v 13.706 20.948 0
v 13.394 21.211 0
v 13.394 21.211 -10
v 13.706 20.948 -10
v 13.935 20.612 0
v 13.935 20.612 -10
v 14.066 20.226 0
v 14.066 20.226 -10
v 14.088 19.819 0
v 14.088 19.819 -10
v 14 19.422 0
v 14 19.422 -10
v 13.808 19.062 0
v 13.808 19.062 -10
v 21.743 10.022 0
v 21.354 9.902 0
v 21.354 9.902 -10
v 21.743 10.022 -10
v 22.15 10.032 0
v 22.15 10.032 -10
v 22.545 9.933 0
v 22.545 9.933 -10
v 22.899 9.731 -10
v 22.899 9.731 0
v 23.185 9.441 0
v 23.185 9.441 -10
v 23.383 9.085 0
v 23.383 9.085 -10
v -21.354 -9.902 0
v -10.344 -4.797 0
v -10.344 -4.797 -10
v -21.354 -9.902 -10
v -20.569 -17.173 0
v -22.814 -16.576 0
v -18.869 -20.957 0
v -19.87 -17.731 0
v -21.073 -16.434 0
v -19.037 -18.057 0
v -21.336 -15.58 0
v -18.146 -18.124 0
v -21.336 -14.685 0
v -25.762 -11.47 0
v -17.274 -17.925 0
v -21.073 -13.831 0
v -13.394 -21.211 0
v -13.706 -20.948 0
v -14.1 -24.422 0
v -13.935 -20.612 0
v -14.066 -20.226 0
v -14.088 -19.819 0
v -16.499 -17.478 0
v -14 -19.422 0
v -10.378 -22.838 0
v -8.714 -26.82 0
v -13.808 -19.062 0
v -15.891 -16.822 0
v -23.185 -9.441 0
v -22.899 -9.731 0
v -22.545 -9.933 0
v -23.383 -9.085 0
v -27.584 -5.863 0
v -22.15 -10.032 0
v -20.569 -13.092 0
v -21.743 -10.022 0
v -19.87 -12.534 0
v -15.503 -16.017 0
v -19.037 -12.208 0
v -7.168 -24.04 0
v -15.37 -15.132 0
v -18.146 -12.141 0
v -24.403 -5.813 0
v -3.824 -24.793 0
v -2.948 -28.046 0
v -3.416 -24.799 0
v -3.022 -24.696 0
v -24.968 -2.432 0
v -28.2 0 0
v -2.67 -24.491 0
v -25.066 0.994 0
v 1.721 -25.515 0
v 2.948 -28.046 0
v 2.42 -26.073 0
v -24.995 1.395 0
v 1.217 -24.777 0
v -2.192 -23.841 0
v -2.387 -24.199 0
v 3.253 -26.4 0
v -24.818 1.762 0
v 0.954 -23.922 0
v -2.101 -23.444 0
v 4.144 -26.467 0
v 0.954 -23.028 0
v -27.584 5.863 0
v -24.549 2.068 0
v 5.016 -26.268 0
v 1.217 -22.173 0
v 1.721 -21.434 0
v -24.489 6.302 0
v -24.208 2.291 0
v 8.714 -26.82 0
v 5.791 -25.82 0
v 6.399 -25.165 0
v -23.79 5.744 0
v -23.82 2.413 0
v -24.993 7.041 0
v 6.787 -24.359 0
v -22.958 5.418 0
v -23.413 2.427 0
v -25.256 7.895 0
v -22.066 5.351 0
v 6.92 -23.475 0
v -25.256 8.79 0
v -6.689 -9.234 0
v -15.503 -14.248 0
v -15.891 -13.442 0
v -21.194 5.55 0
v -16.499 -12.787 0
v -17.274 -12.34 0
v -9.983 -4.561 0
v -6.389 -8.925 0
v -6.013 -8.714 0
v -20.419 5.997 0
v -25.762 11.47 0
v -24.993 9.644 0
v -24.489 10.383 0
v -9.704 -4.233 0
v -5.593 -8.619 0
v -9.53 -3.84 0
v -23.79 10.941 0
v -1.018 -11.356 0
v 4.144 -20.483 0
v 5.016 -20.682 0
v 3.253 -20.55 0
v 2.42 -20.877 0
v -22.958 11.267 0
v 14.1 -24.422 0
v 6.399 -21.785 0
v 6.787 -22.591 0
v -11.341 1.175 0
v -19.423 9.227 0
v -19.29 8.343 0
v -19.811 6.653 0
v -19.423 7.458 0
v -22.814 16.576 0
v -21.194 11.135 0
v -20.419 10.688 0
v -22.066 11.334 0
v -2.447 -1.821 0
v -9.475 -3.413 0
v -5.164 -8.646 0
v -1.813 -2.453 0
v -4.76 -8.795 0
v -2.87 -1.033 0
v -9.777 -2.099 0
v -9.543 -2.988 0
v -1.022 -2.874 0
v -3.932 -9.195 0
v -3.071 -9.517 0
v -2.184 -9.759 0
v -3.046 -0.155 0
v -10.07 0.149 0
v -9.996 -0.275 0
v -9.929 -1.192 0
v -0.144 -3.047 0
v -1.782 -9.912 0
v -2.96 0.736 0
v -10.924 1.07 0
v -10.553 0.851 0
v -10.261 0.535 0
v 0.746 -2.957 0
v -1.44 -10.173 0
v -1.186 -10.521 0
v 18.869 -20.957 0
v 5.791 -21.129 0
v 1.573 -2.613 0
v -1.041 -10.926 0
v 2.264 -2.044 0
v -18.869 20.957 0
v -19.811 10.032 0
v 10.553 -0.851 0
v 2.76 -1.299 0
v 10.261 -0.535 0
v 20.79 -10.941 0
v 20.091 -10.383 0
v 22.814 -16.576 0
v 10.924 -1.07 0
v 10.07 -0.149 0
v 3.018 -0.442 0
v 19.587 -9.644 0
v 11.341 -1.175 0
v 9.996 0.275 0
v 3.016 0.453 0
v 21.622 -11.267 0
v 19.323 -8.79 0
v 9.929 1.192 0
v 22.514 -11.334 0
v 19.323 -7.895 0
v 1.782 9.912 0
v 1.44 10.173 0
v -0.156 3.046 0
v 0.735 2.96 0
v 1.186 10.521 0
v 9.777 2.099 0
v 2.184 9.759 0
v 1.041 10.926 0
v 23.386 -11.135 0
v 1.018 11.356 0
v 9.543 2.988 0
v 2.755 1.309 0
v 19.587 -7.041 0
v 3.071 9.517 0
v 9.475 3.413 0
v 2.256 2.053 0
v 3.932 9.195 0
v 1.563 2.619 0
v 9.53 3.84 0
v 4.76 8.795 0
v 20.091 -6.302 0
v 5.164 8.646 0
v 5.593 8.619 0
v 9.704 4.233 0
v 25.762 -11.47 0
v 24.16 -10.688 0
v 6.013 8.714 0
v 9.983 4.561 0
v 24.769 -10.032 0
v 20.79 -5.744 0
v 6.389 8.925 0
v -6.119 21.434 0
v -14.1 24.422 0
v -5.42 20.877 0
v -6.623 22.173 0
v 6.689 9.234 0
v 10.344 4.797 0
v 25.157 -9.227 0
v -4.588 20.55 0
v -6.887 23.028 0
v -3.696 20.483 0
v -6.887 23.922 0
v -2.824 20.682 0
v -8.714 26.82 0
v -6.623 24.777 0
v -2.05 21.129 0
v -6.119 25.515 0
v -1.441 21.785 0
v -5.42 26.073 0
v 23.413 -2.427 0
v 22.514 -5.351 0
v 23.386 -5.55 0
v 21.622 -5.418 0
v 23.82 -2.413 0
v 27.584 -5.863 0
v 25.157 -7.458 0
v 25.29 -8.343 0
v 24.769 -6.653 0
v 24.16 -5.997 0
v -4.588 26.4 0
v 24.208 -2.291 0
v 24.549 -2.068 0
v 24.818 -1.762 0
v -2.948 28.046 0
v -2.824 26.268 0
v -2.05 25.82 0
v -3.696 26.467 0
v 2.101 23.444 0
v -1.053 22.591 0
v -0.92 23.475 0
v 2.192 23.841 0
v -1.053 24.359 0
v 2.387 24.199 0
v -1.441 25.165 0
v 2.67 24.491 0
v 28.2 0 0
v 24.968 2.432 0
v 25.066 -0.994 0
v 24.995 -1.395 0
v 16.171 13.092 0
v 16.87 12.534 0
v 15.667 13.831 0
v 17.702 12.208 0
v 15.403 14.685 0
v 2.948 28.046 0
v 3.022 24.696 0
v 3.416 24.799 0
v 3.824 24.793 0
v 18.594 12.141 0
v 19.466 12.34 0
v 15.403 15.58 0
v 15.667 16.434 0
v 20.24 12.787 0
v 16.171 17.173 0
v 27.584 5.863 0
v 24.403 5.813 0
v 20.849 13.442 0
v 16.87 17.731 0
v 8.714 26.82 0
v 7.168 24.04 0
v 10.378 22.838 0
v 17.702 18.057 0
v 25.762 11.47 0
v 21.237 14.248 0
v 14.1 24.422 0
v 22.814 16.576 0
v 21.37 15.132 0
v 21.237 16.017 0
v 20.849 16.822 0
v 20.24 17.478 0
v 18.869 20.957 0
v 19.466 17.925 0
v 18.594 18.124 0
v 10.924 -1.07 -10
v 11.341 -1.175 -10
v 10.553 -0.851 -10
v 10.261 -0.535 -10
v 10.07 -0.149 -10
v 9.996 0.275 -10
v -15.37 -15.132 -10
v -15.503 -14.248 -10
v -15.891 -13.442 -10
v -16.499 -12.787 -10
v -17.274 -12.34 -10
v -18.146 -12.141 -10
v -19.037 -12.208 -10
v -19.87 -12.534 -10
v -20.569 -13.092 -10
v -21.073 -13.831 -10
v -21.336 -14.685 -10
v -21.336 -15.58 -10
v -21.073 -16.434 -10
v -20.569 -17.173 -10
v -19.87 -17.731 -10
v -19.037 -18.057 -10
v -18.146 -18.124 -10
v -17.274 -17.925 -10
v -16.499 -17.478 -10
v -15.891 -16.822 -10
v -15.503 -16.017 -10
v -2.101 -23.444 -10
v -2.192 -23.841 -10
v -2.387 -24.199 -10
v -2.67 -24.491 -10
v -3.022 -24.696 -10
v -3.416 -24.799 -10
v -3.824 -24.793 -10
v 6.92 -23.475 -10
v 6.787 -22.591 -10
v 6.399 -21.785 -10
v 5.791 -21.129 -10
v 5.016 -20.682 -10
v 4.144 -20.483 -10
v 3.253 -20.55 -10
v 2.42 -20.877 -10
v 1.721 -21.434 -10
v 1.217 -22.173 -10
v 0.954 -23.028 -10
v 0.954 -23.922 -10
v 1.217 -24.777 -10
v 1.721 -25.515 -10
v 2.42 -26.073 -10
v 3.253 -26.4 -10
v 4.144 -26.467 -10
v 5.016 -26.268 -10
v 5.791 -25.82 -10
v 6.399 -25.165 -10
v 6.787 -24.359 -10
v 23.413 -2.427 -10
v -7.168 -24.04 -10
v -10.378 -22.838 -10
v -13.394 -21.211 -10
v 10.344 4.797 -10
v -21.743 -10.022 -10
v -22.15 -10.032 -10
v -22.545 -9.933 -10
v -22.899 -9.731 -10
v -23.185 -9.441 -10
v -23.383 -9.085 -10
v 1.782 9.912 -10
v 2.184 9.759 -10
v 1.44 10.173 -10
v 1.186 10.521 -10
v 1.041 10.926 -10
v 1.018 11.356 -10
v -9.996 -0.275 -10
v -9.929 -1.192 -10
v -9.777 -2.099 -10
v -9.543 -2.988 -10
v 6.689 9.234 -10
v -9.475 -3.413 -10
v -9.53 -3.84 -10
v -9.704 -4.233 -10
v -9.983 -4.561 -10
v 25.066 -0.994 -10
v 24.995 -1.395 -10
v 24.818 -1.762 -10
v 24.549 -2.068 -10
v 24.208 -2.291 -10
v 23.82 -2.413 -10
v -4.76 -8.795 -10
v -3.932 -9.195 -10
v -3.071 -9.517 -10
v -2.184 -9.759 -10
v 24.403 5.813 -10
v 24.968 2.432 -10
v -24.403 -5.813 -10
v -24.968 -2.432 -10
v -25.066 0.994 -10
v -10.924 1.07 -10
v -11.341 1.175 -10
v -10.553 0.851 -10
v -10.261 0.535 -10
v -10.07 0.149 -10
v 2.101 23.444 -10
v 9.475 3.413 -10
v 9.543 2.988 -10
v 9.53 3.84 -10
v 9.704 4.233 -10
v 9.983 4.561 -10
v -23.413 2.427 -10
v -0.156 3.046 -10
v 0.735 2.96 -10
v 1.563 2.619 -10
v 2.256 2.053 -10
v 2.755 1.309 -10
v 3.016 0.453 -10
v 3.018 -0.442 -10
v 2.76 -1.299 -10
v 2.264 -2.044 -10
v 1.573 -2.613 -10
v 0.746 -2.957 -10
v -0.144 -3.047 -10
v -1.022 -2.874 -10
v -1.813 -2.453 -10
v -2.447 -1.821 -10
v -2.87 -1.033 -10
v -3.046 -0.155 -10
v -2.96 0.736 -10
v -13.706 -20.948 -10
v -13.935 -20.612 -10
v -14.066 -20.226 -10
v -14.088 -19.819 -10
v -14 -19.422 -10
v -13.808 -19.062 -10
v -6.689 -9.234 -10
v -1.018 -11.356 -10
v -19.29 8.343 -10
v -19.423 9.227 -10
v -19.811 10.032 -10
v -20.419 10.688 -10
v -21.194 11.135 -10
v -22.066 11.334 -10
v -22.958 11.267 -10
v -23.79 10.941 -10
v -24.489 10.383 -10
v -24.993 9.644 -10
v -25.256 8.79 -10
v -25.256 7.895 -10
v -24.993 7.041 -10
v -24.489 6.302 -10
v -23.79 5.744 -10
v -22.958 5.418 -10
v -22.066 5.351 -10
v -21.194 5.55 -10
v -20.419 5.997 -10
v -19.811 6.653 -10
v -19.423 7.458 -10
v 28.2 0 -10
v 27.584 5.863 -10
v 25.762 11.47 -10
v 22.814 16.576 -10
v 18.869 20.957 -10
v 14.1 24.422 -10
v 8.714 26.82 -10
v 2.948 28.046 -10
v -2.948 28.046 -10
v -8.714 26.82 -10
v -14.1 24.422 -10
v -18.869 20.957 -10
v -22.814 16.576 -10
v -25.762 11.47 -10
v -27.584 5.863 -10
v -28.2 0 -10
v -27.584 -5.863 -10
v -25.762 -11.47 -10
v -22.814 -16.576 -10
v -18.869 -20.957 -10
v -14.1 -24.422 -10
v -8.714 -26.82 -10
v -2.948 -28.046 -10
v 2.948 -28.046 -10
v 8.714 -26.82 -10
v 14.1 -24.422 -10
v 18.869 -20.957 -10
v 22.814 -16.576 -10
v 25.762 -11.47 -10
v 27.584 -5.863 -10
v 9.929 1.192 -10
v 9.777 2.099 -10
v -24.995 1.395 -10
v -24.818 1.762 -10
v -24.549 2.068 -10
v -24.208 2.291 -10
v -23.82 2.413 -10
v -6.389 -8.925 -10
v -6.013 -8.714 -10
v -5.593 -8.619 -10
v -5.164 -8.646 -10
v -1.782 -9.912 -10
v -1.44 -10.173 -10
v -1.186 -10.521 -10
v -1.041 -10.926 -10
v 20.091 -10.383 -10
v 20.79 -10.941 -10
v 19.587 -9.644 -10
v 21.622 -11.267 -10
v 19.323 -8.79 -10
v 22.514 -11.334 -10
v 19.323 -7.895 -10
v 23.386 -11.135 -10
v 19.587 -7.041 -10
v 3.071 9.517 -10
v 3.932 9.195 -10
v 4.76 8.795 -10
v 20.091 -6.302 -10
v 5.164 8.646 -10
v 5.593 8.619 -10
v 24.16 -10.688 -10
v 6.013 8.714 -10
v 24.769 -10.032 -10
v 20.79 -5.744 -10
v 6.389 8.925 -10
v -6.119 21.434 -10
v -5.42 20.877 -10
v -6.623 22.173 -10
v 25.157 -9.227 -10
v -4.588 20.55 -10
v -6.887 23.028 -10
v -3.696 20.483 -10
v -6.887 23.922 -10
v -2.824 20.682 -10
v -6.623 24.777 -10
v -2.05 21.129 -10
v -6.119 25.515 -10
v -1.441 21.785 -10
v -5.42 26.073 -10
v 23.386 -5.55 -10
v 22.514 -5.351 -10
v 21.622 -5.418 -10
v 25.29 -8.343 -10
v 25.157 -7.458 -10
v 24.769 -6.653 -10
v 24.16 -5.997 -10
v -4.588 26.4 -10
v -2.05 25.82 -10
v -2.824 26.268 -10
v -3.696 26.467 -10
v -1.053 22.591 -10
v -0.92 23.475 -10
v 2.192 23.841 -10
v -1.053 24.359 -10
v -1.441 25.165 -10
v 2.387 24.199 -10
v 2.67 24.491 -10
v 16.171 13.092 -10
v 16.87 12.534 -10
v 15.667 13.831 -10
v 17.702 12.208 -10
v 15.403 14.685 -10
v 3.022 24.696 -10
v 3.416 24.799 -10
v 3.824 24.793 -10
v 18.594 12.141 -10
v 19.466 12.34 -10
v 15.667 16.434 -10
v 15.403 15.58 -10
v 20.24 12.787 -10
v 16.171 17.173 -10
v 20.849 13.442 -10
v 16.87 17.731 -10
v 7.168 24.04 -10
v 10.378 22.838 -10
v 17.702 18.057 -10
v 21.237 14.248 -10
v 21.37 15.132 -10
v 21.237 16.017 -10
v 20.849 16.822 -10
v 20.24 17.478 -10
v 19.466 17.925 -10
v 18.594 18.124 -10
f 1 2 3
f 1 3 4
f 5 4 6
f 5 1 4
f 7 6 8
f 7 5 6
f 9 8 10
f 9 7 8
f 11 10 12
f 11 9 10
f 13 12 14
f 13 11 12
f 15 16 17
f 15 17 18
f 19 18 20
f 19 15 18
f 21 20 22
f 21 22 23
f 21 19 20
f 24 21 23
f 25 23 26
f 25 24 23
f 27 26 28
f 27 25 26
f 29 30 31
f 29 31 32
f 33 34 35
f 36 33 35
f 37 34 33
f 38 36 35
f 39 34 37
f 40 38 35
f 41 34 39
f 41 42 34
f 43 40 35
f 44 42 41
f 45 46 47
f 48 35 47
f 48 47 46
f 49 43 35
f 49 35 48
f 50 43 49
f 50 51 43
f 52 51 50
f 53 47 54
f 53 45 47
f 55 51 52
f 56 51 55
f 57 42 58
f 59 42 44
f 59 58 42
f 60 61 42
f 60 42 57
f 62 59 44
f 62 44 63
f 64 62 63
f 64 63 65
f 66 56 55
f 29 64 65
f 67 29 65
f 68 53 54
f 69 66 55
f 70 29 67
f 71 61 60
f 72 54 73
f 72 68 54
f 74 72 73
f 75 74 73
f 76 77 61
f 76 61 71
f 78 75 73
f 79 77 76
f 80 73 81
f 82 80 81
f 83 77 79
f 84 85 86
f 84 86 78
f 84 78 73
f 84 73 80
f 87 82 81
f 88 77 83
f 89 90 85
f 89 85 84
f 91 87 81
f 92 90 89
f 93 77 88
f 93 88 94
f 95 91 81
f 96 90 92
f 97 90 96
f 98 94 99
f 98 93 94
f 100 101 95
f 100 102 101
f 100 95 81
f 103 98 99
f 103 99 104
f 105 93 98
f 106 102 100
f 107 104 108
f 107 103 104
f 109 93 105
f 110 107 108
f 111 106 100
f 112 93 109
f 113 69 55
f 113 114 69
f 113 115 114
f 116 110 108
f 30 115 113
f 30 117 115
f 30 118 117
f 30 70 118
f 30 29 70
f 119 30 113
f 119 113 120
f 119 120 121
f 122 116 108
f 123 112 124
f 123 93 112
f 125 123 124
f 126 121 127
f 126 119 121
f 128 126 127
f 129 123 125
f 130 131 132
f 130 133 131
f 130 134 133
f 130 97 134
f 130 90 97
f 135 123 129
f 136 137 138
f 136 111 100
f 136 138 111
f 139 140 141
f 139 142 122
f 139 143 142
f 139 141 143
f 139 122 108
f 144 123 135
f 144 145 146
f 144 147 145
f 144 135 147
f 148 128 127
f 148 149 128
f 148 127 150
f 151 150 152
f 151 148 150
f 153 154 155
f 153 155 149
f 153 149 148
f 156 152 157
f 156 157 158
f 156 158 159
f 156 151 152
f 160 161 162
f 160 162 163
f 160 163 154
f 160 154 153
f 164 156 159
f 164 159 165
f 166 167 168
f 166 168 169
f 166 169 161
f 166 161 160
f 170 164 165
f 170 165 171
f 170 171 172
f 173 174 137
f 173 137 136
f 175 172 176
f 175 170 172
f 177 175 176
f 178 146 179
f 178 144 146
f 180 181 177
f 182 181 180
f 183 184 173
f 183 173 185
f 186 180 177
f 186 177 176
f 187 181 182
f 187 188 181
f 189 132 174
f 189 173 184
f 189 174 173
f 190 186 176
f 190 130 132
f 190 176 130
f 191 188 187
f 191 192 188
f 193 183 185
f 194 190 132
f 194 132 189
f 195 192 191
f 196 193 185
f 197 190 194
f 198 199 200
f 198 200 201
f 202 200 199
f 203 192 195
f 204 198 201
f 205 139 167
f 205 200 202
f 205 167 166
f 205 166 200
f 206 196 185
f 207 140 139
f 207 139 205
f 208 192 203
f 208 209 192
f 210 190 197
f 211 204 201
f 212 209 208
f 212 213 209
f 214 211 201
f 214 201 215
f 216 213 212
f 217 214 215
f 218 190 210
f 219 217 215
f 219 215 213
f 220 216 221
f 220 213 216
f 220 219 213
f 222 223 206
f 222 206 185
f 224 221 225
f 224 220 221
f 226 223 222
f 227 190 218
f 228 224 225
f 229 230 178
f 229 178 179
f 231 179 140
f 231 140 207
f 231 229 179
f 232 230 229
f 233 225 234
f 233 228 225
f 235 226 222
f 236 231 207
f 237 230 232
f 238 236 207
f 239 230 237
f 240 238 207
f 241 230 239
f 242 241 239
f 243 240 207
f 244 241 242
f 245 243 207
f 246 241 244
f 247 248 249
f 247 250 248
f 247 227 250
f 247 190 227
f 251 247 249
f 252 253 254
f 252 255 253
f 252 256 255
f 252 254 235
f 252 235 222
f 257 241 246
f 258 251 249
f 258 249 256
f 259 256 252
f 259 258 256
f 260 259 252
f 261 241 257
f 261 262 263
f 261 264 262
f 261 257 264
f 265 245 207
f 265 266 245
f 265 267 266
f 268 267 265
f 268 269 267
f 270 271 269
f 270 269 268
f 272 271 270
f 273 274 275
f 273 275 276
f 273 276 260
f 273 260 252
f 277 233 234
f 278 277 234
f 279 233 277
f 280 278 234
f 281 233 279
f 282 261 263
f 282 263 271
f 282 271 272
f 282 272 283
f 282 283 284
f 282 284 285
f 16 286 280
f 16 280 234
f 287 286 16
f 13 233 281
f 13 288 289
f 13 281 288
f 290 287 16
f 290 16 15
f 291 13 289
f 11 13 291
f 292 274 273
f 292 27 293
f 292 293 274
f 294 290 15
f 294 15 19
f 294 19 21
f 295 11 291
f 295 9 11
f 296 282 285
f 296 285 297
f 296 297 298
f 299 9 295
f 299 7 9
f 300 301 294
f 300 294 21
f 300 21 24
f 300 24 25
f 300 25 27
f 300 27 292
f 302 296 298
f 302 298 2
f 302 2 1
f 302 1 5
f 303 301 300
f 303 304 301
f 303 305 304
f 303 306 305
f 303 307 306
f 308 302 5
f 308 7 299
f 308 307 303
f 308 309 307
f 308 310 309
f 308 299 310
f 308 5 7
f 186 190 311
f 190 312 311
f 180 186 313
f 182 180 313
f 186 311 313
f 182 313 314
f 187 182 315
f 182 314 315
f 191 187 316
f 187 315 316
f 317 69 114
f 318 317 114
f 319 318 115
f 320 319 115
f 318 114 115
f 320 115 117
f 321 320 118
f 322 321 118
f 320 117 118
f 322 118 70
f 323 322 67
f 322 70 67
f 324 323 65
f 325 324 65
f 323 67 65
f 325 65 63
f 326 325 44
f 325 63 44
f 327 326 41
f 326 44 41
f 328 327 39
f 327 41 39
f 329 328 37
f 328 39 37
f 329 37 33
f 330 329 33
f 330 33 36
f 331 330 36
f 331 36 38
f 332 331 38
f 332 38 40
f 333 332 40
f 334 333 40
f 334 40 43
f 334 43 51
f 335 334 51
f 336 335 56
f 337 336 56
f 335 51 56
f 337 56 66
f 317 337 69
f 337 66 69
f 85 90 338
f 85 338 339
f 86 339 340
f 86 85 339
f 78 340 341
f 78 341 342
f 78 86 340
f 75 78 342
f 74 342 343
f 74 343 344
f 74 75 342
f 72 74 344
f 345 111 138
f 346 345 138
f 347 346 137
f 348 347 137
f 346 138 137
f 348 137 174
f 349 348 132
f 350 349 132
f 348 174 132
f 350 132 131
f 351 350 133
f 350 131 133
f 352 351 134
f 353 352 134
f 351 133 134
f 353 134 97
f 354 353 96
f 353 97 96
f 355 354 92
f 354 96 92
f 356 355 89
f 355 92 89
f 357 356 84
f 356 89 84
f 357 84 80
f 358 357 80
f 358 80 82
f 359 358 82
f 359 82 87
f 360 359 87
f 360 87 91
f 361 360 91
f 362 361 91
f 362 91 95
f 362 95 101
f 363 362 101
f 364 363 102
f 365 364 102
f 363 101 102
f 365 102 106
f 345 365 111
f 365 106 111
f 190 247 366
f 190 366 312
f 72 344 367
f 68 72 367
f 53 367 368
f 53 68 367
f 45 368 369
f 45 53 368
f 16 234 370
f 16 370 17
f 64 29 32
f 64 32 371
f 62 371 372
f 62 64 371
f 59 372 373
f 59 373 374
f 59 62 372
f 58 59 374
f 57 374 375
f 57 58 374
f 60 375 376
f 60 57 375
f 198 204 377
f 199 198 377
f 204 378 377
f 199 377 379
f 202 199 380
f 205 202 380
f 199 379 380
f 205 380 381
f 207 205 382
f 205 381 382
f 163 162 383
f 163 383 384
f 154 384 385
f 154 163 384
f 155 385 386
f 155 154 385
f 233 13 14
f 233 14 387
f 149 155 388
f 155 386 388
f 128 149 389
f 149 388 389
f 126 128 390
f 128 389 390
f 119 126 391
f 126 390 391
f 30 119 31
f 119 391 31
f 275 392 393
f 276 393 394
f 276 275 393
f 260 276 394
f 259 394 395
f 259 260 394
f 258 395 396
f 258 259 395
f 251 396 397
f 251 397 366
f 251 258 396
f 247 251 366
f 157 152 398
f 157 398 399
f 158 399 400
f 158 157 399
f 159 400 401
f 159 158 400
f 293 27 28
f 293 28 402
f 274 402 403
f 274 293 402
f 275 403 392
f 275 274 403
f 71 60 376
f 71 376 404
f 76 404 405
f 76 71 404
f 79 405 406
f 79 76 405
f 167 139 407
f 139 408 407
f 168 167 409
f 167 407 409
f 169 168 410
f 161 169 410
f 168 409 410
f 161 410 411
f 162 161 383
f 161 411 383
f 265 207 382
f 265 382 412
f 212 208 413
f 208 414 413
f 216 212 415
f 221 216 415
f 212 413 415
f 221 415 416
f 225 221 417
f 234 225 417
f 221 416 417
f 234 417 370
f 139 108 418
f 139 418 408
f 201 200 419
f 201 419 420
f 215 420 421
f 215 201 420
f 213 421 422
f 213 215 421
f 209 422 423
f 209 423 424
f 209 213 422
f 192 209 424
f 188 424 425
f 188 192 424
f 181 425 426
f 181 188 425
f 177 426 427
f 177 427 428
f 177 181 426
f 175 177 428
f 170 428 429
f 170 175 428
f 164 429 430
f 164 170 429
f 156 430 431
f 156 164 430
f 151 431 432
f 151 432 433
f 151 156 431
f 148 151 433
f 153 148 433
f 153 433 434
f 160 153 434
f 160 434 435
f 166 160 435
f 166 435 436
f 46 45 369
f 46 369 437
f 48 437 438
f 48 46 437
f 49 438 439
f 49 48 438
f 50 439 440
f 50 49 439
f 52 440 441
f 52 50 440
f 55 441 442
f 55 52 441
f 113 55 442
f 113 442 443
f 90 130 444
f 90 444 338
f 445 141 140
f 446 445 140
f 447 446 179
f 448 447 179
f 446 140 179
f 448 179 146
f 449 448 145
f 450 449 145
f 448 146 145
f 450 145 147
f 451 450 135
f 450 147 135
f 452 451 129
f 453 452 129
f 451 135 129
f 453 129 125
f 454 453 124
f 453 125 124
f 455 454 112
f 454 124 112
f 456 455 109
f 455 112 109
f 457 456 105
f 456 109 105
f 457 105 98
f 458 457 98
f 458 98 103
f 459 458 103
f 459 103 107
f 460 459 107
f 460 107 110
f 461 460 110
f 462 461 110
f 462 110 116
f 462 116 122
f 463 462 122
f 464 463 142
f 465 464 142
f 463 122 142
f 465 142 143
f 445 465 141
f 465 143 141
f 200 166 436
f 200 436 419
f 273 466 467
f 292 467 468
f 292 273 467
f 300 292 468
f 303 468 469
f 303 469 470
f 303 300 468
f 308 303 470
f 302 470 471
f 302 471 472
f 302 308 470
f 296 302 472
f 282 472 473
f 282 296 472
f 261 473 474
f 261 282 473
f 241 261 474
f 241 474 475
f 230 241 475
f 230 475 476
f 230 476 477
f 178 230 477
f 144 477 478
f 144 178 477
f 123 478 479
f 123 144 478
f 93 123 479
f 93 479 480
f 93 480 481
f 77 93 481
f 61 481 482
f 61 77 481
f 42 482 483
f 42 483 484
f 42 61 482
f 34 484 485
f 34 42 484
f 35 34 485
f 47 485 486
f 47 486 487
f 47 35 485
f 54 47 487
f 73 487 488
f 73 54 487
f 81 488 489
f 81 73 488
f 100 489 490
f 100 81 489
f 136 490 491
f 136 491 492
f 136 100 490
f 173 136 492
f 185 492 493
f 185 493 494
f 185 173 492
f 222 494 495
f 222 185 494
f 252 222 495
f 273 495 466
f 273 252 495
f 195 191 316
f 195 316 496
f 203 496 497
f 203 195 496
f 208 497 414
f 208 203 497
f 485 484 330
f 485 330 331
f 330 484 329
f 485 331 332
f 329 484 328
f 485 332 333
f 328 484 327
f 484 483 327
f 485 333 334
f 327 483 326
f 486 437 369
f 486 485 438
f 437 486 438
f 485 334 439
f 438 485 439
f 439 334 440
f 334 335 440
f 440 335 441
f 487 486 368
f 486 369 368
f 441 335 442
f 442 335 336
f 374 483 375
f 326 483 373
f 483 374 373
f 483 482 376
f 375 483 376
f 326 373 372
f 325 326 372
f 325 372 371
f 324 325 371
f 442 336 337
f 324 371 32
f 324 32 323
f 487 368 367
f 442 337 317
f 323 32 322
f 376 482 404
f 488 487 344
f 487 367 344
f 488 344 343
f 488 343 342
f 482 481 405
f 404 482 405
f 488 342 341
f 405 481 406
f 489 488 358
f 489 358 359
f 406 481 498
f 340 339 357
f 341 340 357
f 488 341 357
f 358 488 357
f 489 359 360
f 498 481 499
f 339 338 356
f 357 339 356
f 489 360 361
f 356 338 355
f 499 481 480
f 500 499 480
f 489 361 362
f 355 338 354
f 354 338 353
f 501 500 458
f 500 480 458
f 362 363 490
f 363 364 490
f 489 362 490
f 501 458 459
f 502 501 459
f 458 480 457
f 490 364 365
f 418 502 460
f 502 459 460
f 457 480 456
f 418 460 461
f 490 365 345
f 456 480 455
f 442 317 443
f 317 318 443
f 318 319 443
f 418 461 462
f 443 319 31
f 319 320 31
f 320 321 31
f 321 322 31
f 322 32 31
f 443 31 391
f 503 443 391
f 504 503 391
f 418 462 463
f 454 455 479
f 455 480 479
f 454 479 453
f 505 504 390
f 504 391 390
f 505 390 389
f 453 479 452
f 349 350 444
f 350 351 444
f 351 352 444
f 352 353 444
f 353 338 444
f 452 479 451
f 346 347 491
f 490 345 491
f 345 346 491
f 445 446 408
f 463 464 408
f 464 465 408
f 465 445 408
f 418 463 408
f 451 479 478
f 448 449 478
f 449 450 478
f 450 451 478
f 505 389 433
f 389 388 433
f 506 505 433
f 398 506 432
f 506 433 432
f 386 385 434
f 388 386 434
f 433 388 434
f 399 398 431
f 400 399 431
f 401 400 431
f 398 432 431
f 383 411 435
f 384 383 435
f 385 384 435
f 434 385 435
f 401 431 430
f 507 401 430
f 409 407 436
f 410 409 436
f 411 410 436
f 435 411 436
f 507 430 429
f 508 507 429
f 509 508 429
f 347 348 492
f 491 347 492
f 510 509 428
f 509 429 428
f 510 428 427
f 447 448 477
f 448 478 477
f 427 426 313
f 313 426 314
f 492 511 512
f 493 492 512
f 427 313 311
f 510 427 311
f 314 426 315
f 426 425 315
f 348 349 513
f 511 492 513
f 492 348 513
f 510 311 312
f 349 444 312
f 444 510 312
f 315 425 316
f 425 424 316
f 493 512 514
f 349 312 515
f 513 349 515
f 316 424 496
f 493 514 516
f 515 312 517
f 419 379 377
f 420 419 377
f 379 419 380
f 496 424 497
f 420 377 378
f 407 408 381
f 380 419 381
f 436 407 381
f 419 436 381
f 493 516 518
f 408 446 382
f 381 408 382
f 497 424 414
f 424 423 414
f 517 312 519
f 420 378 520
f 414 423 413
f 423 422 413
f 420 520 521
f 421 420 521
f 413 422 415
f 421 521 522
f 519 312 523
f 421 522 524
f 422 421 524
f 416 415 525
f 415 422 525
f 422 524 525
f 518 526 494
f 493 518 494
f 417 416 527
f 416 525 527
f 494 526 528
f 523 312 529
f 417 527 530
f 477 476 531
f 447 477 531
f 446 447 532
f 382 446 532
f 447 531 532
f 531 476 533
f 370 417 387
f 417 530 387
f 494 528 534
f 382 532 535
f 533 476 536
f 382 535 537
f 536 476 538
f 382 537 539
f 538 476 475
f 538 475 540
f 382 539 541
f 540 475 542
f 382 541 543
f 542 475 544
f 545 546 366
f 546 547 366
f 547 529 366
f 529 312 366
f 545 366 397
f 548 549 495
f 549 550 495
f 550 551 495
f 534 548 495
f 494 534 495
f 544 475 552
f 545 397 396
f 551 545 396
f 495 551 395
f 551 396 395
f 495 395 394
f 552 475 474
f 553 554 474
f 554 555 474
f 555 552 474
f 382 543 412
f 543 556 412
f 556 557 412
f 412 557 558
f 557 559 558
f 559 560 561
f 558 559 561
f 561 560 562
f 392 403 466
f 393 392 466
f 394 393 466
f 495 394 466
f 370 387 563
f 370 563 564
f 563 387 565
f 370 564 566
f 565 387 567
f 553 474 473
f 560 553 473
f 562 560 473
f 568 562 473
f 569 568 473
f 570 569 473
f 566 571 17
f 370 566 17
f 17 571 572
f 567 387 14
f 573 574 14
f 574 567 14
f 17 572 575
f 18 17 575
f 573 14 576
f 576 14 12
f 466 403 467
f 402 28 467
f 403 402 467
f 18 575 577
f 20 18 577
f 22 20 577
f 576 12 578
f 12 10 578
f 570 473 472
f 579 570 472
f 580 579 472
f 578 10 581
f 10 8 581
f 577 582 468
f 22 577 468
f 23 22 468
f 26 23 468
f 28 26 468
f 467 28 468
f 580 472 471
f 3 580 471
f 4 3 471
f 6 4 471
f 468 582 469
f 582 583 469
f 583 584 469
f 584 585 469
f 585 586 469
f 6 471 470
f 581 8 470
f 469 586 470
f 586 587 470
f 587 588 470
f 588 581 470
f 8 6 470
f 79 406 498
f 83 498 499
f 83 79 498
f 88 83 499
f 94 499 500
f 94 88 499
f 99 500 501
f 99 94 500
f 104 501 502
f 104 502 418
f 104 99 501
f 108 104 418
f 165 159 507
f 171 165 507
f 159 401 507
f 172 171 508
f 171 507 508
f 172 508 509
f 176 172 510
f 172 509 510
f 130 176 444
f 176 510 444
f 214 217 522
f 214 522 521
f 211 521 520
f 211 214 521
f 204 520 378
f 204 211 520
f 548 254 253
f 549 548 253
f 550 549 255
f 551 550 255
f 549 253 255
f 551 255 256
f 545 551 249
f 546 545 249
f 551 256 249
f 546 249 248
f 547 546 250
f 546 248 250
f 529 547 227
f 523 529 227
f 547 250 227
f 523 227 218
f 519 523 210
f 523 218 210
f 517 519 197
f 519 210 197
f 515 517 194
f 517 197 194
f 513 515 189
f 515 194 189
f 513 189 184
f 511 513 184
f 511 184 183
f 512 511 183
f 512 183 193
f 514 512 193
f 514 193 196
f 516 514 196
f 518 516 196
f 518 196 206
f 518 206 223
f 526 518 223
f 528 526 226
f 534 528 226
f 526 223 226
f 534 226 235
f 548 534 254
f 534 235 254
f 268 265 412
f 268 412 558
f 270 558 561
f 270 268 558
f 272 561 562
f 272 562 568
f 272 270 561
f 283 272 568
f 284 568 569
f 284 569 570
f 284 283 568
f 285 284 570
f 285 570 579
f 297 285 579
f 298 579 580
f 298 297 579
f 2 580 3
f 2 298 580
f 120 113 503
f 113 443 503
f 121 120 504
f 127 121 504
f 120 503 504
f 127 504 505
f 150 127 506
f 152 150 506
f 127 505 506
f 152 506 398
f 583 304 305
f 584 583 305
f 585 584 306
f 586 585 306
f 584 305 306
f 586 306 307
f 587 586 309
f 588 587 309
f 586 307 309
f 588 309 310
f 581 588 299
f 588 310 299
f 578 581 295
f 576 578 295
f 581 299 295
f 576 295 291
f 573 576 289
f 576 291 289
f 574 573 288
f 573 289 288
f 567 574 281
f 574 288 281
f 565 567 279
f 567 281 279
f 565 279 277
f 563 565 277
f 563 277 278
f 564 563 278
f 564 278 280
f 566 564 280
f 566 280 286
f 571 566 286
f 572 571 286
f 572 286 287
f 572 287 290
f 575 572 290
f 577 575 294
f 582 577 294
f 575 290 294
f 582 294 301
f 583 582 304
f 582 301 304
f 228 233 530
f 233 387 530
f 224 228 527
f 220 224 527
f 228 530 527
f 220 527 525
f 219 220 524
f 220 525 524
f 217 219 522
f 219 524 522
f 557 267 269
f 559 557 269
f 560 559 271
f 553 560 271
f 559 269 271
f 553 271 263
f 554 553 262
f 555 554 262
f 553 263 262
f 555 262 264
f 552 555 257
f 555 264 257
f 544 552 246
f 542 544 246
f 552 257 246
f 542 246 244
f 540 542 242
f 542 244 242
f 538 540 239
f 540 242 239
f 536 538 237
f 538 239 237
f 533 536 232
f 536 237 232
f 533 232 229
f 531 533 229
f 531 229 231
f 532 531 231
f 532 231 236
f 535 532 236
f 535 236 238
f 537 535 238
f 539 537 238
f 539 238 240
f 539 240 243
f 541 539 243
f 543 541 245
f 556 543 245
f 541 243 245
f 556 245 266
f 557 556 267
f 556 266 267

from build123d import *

# Parameters (mm, degrees)
SKETCH1_6_R         = 28.2
SKETCH1_6_R_2       = 3
BOSS_EXTRUDE4_DEPTH = 10
FILLET4_R           = 1.5


with BuildPart() as part:
    # Sketch1_6 → Boss-Extrude4 (new body)
    with BuildSketch(Plane.XY):
        Circle(SKETCH1_6_R)
        with BuildLine():
            ThreePointArc((5.866209712, 8.098616155), (3.505253449, 9.36553246), (0.892648331, 9.960079265))
            Line((0.892648331, 9.960079265), (2.101110424, 23.44397635))
            ThreePointArc((2.101110424, 23.44397635), (2.670485373, 24.491199978), (3.823764506, 24.792550937))
            ThreePointArc((3.823764506, 24.792550937), (8.793169539, 23.494082796), (13.393949598, 21.210701807))
            ThreePointArc((13.393949598, 21.210701807), (14.065968099, 20.226193659), (13.807850128, 19.062475363))
            Line((13.807850128, 19.062475363), (5.866209712, 8.098616155))
        make_face(mode=Mode.SUBTRACT)
        with BuildLine():
            ThreePointArc((-9.946712181, 1.030978557), (-9.863415755, -1.647127697), (-9.072005832, -4.206983501))
            Line((-9.072005832, -4.206983501), (-21.353634297, -9.902373172))
            ThreePointArc((-21.353634297, -9.902373172), (-22.545244036, -9.932891816), (-23.382861189, -9.084798269))
            ThreePointArc((-23.382861189, -9.084798269), (-24.74305731, -4.131933198), (-25.065981396, 0.994149706))
            ThreePointArc((-25.065981396, 0.994149706), (-24.54938158, 2.068388873), (-23.412512987, 2.426711301))
            Line((-23.412512987, 2.426711301), (-9.946712181, 1.030978557))
        make_face(mode=Mode.SUBTRACT)
        with BuildLine():
            ThreePointArc((-5.866209712, -8.098616155), (-3.505253449, -9.36553246), (-0.892648331, -9.960079265))
            Line((-0.892648331, -9.960079265), (-2.101110424, -23.44397635))
            ThreePointArc((-2.101110424, -23.44397635), (-2.670485373, -24.491199978), (-3.823764506, -24.792550937))
            ThreePointArc((-3.823764506, -24.792550937), (-8.793169539, -23.494082796), (-13.393949598, -21.210701807))
            ThreePointArc((-13.393949598, -21.210701807), (-14.065968099, -20.226193659), (-13.807850128, -19.062475363))
            Line((-13.807850128, -19.062475363), (-5.866209712, -8.098616155))
        make_face(mode=Mode.SUBTRACT)
        with BuildLine():
            ThreePointArc((9.946712181, -1.030978557), (9.863415755, 1.647127697), (9.072005832, 4.206983501))
            Line((9.072005832, 4.206983501), (21.353634297, 9.902373172))
            ThreePointArc((21.353634297, 9.902373172), (22.545244036, 9.932891816), (23.382861189, 9.084798269))
            ThreePointArc((23.382861189, 9.084798269), (24.74305731, 4.131933198), (25.065981396, -0.994149706))
            ThreePointArc((25.065981396, -0.994149706), (24.54938158, -2.068388873), (23.412512987, -2.426711301))
            Line((23.412512987, -2.426711301), (9.946712181, -1.030978557))
        make_face(mode=Mode.SUBTRACT)
        with Locations((-18.369803336, -15.132426289)):
            Circle(SKETCH1_6_R_2, mode=Mode.SUBTRACT)
        with Locations((3.920163919, -23.474929496)):
            Circle(SKETCH1_6_R_2, mode=Mode.SUBTRACT)
        with Locations((22.289967255, -8.342503208)):
            Circle(SKETCH1_6_R_2, mode=Mode.SUBTRACT)
        with Locations((-22.289967255, 8.342503208)):
            Circle(SKETCH1_6_R_2, mode=Mode.SUBTRACT)
        with Locations((18.369803336, 15.132426289)):
            Circle(SKETCH1_6_R_2, mode=Mode.SUBTRACT)
        with Locations((-3.920163919, 23.474929496)):
            Circle(SKETCH1_6_R_2, mode=Mode.SUBTRACT)
        with BuildLine():
            ThreePointArc((-0.15563191, 3.046026708), (1.939239503, -2.354113453), (-2.95986762, 0.735991626))
            Line((-2.95986762, 0.735991626), (-0.15563191, 3.046026708))
        make_face(mode=Mode.SUBTRACT)
    extrude(amount=-BOSS_EXTRUDE4_DEPTH)

    # Fillet4
    fillet4_edges = [part.edges().sort_by_distance(p)[0] for p in [
        (-5.866209712, -8.098616155, -5),
        (-0.892648331, -9.960079265, -5),
        (9.072005832, 4.206983501, -5),
        (9.946712181, -1.030978557, -5),
        (0.892648331, 9.960079265, -5),
        (5.866209712, 8.098616155, -5),
        (-9.072005832, -4.206983501, -5),
        (-9.946712181, 1.030978557, -5),
    ]]
    fillet(fillet4_edges, radius=FILLET4_R)


solid = part.part
